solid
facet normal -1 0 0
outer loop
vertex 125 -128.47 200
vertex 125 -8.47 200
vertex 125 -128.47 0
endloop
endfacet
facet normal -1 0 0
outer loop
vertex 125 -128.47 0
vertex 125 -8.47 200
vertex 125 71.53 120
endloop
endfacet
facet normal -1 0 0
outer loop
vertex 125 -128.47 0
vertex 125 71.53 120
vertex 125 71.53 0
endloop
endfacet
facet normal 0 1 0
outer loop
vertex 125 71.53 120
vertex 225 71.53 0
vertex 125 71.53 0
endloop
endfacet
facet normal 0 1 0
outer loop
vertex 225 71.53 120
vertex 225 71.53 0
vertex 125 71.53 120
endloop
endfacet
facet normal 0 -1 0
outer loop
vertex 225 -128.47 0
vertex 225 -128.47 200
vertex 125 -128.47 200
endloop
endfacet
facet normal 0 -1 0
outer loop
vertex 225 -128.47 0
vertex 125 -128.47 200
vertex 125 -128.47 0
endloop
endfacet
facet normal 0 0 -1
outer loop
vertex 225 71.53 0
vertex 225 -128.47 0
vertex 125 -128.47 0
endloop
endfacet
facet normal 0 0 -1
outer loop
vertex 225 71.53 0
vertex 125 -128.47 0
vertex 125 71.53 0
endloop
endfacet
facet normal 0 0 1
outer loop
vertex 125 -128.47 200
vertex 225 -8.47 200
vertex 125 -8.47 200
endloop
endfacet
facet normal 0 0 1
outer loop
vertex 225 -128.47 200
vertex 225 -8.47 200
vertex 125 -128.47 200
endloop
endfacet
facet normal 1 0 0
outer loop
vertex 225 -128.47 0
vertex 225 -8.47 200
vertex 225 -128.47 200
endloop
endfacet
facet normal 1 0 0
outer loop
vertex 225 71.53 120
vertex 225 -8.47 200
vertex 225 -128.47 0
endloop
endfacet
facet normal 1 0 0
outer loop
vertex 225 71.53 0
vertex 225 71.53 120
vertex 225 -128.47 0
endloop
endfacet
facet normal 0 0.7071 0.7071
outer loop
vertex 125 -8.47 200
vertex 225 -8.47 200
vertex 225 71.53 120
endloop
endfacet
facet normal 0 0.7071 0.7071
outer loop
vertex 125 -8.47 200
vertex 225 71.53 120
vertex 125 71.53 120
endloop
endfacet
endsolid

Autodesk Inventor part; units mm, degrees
ref_plane "YZ Plane" through (0, 0, 0) normal (1, 0, 0) x (0, 1, 0)
ref_plane "XZ Plane" through (0, 0, 0) normal (0, 1, 0) x (-1, 0, 0)
ref_plane "XY Plane" through (0, 0, 0) normal (0, 0, 1) x (1, 0, 0)
ref_plane "Work Plane1" through (225, -51.9999, -200.9642) normal (1, 0, 0) x (0, 0, -1)
sketch "Sketch1" plane through (225, -51.9999, -200.9642) normal (1, 0, 0) x (0, 0, -1)
  line L0 (-200.9642, 89.4999) -> (-130.9642, 89.4999) projected
  line L1 (-130.9642, 89.4999) -> (-130.9642, 14.4999) projected
  line L2 (-130.9642, 14.4999) -> (-200.9642, 14.4999) projected
  line L3 (-200.9642, 14.4999) -> (-200.9642, -53.5599) projected
  line L4 (-200.9642, -53.5599) -> (-122.2497, -53.5599) projected
  ellipse E0 centre (-122.3295, -48.5209) end of major axis (-118.6887, -52.0634) minor radius 5 (-122.2497, -53.5599) -> (-117.3008, -48.2463) ccw projected
  line L5 (-117.3008, -48.2463) -> (-117.6163, -43.7662) projected
  line L6 (-117.6163, -43.7662) -> (-94.1545, -42.114) projected
  line L7 (-94.1545, -42.114) -> (-81.3155, 140.1971) projected
  arc A0 (-81.3155, 140.1971) -> (-85.9519, 145.536) centre (-86.3031, 140.5484) ccw projected
  line L8 (-85.9519, 145.536) -> (-117.6163, 147.7659) projected
  line L9 (-117.6163, 147.7659) -> (-117.3008, 152.246) projected
  ellipse E1 centre (-122.3295, 152.5206) end of major axis (-118.6887, 156.0631) minor radius 5 (-117.3008, 152.246) -> (-122.2497, 157.5596) ccw projected
  line L10 (-122.2497, 157.5596) -> (-200.9642, 157.5596) projected
  line L11 (-200.9642, 89.4999) -> (-200.9642, 157.5596) projected
  line L12 (-200.9642, 123.5297) -> (-400.9642, 123.5297)
  line L13 (-400.9642, 123.5297) -> (-400.9642, -76.4703)
  line L14 (-400.9642, -76.4703) -> (-200.9642, -76.4703)
  line L15 (-200.9642, -76.4703) -> (-200.9642, 123.5297)
  line L16 (-348.854, 122.9439) -> (-400.9642, 70.8337)
  line L17 (-347.4398, 123.5297) -> (-273.7448, 123.5297) construction
  arc A1 (-347.4398, 123.5297) -> (-348.854, 122.9439) centre (-347.4398, 121.5297) ccw
  point P0 (-200.9642, 51.9999)
  point P1 (-348.2682, 123.5297)
  dimension "d0" = 200
  dimension "d1" = 200
  dimension "d2" = 135
  dimension "d3" = 2
extrude "Extrusion1" add sketch "Sketch1" against normal blind 100 contours L15 L3 L14 L13 L16 A1 L12 L11 | A1 L16 L13 L12
chamfer "Chamfer1" distance 80 angle 45 1 edges at (175, 71.5299, 200)
properties part number "00_STORMModule"
